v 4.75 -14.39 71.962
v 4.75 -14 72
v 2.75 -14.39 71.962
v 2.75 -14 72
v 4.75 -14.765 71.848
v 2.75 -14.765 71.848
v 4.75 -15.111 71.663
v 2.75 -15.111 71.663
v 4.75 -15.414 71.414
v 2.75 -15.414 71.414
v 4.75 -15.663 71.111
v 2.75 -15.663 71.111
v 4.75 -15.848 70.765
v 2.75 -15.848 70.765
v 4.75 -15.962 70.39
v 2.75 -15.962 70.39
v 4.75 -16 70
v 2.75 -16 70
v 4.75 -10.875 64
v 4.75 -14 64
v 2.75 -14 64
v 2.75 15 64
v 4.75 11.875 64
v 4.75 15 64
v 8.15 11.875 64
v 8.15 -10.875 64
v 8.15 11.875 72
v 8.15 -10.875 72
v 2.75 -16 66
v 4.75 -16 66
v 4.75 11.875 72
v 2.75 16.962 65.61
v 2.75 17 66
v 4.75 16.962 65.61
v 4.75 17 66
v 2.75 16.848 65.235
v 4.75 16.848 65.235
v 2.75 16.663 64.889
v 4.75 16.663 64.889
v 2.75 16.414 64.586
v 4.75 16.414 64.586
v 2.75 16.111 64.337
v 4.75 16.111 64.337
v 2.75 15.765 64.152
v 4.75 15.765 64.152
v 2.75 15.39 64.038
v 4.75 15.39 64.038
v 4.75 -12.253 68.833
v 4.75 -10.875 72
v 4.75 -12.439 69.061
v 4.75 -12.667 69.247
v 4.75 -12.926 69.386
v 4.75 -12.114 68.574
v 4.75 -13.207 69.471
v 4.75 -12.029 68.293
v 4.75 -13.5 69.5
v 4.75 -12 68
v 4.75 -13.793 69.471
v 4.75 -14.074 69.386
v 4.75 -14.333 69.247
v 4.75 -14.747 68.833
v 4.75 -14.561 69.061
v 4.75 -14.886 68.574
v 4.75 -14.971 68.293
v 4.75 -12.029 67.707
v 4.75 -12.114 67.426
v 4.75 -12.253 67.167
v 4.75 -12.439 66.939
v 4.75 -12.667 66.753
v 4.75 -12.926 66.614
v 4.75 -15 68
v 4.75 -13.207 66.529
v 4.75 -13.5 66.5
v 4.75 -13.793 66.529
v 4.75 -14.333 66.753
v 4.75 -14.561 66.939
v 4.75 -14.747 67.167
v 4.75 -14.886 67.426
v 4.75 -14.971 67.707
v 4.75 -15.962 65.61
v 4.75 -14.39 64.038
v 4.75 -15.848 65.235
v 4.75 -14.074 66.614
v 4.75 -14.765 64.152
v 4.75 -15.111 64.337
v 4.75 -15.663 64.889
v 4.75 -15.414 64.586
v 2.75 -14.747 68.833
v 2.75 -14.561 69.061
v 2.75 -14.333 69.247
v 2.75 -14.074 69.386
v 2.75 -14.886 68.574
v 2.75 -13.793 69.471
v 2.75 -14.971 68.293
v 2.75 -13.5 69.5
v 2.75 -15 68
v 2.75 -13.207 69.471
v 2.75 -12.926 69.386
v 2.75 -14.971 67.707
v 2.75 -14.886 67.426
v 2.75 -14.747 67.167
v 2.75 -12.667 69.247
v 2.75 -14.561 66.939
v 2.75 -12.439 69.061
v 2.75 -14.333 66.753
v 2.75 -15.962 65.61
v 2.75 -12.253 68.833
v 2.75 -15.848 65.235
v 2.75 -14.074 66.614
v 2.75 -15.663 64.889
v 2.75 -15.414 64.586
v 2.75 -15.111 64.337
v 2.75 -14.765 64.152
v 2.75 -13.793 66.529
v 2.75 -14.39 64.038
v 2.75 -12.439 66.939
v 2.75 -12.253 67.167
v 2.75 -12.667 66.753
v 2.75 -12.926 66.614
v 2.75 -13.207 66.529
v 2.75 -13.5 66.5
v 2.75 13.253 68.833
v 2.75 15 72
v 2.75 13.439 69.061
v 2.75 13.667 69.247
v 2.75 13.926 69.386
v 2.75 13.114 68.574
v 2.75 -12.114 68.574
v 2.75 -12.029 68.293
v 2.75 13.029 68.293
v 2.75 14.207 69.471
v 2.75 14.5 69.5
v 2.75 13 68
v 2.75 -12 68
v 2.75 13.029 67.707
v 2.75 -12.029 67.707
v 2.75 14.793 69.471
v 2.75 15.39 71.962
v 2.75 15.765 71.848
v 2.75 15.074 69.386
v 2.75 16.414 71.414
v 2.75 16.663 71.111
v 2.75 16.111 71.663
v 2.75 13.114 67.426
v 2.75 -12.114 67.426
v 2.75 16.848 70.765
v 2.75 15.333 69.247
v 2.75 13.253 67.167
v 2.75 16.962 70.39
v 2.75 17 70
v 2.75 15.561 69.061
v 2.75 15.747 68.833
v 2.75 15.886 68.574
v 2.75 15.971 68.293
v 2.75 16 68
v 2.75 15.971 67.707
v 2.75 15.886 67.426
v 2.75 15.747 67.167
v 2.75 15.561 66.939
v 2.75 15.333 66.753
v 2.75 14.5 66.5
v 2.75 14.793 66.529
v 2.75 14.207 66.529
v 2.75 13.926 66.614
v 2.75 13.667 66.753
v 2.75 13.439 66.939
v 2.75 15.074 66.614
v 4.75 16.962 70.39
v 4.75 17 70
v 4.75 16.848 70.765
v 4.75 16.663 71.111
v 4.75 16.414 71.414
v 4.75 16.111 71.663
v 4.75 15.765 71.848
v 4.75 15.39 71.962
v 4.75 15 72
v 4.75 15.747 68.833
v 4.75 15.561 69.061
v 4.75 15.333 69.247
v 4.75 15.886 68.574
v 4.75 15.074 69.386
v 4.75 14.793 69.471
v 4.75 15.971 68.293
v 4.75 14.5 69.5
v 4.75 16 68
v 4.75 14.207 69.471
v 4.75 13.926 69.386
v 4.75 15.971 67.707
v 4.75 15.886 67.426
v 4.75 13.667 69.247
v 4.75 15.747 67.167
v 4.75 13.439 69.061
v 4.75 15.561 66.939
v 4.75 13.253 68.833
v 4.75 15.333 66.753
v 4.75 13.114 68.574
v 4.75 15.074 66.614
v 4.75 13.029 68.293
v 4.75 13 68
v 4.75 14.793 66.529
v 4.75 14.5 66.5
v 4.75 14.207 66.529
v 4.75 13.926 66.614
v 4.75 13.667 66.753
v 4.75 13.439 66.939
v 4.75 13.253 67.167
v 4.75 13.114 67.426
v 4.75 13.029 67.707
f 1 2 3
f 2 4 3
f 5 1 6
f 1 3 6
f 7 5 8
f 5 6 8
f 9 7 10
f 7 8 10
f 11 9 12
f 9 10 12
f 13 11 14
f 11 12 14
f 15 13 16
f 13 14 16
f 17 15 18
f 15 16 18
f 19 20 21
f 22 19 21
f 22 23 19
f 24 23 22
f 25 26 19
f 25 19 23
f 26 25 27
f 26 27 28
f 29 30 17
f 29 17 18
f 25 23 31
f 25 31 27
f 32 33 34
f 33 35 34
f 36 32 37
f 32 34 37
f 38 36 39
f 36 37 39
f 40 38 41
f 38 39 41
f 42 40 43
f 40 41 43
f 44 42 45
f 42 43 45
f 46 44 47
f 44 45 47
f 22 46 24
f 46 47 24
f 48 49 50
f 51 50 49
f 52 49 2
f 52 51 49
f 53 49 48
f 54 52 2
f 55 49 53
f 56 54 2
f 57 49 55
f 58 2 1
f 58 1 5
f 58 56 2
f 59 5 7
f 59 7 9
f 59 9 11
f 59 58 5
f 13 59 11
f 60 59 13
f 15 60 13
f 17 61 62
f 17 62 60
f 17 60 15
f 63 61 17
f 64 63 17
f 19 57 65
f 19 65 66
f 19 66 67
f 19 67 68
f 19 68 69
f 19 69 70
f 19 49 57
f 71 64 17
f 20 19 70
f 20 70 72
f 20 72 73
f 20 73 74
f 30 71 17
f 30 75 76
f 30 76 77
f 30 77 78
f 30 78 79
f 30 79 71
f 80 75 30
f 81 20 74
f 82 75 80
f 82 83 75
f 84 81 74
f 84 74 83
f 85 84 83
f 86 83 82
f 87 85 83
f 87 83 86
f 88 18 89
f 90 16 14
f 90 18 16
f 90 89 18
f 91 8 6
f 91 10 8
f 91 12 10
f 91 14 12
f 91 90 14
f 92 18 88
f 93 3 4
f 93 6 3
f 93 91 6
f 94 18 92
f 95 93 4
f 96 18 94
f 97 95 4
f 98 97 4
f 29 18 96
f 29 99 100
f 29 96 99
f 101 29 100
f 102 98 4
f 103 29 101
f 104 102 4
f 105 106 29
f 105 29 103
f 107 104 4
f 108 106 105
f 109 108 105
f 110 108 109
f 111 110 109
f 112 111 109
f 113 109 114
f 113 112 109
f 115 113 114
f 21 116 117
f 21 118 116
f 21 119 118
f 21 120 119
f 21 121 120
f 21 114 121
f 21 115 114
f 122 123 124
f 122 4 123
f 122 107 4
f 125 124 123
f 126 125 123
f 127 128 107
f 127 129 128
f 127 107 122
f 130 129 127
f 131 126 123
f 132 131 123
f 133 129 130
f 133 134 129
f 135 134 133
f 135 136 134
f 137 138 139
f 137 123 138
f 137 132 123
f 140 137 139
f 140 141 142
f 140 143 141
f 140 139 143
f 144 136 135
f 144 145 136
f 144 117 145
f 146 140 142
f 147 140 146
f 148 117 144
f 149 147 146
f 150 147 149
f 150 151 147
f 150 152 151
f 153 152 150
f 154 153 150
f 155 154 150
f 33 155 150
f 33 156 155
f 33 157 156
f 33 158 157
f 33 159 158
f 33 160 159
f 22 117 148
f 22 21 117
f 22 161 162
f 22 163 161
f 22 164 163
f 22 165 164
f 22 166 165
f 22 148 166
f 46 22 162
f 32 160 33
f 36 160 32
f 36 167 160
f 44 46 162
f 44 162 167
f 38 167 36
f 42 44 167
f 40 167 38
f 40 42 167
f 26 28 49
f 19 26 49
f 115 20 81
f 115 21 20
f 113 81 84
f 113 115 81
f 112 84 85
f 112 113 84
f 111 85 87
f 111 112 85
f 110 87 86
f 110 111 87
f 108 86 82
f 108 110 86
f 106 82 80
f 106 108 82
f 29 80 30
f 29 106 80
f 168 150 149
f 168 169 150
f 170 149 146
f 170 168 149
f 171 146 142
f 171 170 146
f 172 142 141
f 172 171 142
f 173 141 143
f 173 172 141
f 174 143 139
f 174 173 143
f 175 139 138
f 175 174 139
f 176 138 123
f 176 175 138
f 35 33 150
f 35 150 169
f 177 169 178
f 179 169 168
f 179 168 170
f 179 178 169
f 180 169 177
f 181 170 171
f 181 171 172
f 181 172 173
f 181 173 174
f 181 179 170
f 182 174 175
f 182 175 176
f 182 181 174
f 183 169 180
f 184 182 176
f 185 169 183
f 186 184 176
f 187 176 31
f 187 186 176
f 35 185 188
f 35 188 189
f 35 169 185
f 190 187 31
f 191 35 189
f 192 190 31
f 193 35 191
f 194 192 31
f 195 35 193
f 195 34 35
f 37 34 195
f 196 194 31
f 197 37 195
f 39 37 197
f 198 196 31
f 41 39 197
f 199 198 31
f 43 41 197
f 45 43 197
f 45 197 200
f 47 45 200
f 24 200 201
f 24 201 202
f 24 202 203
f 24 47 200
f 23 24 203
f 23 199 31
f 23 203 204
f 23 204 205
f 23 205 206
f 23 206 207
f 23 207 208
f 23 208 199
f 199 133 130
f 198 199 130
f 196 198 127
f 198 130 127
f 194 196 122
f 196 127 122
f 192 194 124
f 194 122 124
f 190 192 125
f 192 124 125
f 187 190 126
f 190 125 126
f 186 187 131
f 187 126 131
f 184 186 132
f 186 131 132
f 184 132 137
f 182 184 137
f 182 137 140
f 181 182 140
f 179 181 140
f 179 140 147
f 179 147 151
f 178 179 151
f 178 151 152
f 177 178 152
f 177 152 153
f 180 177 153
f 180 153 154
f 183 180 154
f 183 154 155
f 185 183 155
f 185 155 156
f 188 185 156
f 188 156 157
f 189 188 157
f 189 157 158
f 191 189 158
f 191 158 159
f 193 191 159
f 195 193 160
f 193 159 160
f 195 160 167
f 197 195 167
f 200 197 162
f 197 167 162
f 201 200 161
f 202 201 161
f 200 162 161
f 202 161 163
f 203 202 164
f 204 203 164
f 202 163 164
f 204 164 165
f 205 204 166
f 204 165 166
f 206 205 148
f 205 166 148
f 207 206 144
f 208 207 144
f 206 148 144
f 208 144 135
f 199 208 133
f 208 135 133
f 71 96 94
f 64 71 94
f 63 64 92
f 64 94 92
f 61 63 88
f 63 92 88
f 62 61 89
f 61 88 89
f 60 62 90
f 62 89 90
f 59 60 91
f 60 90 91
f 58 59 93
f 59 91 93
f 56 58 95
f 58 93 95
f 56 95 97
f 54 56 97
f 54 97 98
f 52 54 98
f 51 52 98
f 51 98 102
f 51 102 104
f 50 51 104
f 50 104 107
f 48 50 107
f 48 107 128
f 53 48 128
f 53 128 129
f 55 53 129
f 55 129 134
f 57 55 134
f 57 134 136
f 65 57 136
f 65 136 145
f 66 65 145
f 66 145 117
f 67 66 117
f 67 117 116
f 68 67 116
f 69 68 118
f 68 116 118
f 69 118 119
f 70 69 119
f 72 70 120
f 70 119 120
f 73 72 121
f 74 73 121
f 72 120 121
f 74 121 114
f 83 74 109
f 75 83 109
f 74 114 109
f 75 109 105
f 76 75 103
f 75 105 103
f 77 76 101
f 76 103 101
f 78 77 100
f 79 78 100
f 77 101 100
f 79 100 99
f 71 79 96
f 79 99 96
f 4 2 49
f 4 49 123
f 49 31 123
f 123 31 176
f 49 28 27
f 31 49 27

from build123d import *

# Parameters (mm, degrees)
PAD010_DEPTH            = 8
SKETCH006_R             = 1.5
POCKET013_DEPTH         = 5
FILLET007_R             = 2
BODY002_PITCH_ANGLE     = -90
BODY002_PLACEMENT_ANGLE = -180


with BuildPart() as part:
    # Sketch005 → Pad010 (new body)
    with BuildSketch(Plane.YZ):
        Polygon((-17, -5), (-11.875, -5), (-11.875, -1.6), (10.875, -1.6), (10.875, -5), (16, -5), (16, -7), (-17, -7), align=None)
    extrude(amount=PAD010_DEPTH)

    # Sketch006 (on Face7 of Pad010) → Pocket013 (cut)
    with BuildSketch(Plane.YX.offset(7)):
        with Locations((-14.5, 4)):
            Circle(SKETCH006_R)
        with Locations((13.5, 4)):
            Circle(SKETCH006_R)
    extrude(amount=-POCKET013_DEPTH, mode=Mode.SUBTRACT)

    # Fillet007
    fillet007_edges = [part.edges().sort_by_distance(p)[0] for p in [
        (8, -17, -6),
        (0, -17, -6),
        (8, 16, -6),
        (0, 16, -6),
    ]]
    fillet(fillet007_edges, radius=FILLET007_R)


with BuildPart() as part_1:
    # Body002 pitch: moved
    add(part.part.rotate(Axis((0, 0, 0), (0, 1, 0)), BODY002_PITCH_ANGLE))


with BuildPart() as part_2:
    # Body002 placement: moved
    add(part_1.part.moved(Location((9.75, 0, 64))).rotate(Axis((9.75, 0, 64), (0, 0, 1)), BODY002_PLACEMENT_ANGLE))


solid = part_2.part
